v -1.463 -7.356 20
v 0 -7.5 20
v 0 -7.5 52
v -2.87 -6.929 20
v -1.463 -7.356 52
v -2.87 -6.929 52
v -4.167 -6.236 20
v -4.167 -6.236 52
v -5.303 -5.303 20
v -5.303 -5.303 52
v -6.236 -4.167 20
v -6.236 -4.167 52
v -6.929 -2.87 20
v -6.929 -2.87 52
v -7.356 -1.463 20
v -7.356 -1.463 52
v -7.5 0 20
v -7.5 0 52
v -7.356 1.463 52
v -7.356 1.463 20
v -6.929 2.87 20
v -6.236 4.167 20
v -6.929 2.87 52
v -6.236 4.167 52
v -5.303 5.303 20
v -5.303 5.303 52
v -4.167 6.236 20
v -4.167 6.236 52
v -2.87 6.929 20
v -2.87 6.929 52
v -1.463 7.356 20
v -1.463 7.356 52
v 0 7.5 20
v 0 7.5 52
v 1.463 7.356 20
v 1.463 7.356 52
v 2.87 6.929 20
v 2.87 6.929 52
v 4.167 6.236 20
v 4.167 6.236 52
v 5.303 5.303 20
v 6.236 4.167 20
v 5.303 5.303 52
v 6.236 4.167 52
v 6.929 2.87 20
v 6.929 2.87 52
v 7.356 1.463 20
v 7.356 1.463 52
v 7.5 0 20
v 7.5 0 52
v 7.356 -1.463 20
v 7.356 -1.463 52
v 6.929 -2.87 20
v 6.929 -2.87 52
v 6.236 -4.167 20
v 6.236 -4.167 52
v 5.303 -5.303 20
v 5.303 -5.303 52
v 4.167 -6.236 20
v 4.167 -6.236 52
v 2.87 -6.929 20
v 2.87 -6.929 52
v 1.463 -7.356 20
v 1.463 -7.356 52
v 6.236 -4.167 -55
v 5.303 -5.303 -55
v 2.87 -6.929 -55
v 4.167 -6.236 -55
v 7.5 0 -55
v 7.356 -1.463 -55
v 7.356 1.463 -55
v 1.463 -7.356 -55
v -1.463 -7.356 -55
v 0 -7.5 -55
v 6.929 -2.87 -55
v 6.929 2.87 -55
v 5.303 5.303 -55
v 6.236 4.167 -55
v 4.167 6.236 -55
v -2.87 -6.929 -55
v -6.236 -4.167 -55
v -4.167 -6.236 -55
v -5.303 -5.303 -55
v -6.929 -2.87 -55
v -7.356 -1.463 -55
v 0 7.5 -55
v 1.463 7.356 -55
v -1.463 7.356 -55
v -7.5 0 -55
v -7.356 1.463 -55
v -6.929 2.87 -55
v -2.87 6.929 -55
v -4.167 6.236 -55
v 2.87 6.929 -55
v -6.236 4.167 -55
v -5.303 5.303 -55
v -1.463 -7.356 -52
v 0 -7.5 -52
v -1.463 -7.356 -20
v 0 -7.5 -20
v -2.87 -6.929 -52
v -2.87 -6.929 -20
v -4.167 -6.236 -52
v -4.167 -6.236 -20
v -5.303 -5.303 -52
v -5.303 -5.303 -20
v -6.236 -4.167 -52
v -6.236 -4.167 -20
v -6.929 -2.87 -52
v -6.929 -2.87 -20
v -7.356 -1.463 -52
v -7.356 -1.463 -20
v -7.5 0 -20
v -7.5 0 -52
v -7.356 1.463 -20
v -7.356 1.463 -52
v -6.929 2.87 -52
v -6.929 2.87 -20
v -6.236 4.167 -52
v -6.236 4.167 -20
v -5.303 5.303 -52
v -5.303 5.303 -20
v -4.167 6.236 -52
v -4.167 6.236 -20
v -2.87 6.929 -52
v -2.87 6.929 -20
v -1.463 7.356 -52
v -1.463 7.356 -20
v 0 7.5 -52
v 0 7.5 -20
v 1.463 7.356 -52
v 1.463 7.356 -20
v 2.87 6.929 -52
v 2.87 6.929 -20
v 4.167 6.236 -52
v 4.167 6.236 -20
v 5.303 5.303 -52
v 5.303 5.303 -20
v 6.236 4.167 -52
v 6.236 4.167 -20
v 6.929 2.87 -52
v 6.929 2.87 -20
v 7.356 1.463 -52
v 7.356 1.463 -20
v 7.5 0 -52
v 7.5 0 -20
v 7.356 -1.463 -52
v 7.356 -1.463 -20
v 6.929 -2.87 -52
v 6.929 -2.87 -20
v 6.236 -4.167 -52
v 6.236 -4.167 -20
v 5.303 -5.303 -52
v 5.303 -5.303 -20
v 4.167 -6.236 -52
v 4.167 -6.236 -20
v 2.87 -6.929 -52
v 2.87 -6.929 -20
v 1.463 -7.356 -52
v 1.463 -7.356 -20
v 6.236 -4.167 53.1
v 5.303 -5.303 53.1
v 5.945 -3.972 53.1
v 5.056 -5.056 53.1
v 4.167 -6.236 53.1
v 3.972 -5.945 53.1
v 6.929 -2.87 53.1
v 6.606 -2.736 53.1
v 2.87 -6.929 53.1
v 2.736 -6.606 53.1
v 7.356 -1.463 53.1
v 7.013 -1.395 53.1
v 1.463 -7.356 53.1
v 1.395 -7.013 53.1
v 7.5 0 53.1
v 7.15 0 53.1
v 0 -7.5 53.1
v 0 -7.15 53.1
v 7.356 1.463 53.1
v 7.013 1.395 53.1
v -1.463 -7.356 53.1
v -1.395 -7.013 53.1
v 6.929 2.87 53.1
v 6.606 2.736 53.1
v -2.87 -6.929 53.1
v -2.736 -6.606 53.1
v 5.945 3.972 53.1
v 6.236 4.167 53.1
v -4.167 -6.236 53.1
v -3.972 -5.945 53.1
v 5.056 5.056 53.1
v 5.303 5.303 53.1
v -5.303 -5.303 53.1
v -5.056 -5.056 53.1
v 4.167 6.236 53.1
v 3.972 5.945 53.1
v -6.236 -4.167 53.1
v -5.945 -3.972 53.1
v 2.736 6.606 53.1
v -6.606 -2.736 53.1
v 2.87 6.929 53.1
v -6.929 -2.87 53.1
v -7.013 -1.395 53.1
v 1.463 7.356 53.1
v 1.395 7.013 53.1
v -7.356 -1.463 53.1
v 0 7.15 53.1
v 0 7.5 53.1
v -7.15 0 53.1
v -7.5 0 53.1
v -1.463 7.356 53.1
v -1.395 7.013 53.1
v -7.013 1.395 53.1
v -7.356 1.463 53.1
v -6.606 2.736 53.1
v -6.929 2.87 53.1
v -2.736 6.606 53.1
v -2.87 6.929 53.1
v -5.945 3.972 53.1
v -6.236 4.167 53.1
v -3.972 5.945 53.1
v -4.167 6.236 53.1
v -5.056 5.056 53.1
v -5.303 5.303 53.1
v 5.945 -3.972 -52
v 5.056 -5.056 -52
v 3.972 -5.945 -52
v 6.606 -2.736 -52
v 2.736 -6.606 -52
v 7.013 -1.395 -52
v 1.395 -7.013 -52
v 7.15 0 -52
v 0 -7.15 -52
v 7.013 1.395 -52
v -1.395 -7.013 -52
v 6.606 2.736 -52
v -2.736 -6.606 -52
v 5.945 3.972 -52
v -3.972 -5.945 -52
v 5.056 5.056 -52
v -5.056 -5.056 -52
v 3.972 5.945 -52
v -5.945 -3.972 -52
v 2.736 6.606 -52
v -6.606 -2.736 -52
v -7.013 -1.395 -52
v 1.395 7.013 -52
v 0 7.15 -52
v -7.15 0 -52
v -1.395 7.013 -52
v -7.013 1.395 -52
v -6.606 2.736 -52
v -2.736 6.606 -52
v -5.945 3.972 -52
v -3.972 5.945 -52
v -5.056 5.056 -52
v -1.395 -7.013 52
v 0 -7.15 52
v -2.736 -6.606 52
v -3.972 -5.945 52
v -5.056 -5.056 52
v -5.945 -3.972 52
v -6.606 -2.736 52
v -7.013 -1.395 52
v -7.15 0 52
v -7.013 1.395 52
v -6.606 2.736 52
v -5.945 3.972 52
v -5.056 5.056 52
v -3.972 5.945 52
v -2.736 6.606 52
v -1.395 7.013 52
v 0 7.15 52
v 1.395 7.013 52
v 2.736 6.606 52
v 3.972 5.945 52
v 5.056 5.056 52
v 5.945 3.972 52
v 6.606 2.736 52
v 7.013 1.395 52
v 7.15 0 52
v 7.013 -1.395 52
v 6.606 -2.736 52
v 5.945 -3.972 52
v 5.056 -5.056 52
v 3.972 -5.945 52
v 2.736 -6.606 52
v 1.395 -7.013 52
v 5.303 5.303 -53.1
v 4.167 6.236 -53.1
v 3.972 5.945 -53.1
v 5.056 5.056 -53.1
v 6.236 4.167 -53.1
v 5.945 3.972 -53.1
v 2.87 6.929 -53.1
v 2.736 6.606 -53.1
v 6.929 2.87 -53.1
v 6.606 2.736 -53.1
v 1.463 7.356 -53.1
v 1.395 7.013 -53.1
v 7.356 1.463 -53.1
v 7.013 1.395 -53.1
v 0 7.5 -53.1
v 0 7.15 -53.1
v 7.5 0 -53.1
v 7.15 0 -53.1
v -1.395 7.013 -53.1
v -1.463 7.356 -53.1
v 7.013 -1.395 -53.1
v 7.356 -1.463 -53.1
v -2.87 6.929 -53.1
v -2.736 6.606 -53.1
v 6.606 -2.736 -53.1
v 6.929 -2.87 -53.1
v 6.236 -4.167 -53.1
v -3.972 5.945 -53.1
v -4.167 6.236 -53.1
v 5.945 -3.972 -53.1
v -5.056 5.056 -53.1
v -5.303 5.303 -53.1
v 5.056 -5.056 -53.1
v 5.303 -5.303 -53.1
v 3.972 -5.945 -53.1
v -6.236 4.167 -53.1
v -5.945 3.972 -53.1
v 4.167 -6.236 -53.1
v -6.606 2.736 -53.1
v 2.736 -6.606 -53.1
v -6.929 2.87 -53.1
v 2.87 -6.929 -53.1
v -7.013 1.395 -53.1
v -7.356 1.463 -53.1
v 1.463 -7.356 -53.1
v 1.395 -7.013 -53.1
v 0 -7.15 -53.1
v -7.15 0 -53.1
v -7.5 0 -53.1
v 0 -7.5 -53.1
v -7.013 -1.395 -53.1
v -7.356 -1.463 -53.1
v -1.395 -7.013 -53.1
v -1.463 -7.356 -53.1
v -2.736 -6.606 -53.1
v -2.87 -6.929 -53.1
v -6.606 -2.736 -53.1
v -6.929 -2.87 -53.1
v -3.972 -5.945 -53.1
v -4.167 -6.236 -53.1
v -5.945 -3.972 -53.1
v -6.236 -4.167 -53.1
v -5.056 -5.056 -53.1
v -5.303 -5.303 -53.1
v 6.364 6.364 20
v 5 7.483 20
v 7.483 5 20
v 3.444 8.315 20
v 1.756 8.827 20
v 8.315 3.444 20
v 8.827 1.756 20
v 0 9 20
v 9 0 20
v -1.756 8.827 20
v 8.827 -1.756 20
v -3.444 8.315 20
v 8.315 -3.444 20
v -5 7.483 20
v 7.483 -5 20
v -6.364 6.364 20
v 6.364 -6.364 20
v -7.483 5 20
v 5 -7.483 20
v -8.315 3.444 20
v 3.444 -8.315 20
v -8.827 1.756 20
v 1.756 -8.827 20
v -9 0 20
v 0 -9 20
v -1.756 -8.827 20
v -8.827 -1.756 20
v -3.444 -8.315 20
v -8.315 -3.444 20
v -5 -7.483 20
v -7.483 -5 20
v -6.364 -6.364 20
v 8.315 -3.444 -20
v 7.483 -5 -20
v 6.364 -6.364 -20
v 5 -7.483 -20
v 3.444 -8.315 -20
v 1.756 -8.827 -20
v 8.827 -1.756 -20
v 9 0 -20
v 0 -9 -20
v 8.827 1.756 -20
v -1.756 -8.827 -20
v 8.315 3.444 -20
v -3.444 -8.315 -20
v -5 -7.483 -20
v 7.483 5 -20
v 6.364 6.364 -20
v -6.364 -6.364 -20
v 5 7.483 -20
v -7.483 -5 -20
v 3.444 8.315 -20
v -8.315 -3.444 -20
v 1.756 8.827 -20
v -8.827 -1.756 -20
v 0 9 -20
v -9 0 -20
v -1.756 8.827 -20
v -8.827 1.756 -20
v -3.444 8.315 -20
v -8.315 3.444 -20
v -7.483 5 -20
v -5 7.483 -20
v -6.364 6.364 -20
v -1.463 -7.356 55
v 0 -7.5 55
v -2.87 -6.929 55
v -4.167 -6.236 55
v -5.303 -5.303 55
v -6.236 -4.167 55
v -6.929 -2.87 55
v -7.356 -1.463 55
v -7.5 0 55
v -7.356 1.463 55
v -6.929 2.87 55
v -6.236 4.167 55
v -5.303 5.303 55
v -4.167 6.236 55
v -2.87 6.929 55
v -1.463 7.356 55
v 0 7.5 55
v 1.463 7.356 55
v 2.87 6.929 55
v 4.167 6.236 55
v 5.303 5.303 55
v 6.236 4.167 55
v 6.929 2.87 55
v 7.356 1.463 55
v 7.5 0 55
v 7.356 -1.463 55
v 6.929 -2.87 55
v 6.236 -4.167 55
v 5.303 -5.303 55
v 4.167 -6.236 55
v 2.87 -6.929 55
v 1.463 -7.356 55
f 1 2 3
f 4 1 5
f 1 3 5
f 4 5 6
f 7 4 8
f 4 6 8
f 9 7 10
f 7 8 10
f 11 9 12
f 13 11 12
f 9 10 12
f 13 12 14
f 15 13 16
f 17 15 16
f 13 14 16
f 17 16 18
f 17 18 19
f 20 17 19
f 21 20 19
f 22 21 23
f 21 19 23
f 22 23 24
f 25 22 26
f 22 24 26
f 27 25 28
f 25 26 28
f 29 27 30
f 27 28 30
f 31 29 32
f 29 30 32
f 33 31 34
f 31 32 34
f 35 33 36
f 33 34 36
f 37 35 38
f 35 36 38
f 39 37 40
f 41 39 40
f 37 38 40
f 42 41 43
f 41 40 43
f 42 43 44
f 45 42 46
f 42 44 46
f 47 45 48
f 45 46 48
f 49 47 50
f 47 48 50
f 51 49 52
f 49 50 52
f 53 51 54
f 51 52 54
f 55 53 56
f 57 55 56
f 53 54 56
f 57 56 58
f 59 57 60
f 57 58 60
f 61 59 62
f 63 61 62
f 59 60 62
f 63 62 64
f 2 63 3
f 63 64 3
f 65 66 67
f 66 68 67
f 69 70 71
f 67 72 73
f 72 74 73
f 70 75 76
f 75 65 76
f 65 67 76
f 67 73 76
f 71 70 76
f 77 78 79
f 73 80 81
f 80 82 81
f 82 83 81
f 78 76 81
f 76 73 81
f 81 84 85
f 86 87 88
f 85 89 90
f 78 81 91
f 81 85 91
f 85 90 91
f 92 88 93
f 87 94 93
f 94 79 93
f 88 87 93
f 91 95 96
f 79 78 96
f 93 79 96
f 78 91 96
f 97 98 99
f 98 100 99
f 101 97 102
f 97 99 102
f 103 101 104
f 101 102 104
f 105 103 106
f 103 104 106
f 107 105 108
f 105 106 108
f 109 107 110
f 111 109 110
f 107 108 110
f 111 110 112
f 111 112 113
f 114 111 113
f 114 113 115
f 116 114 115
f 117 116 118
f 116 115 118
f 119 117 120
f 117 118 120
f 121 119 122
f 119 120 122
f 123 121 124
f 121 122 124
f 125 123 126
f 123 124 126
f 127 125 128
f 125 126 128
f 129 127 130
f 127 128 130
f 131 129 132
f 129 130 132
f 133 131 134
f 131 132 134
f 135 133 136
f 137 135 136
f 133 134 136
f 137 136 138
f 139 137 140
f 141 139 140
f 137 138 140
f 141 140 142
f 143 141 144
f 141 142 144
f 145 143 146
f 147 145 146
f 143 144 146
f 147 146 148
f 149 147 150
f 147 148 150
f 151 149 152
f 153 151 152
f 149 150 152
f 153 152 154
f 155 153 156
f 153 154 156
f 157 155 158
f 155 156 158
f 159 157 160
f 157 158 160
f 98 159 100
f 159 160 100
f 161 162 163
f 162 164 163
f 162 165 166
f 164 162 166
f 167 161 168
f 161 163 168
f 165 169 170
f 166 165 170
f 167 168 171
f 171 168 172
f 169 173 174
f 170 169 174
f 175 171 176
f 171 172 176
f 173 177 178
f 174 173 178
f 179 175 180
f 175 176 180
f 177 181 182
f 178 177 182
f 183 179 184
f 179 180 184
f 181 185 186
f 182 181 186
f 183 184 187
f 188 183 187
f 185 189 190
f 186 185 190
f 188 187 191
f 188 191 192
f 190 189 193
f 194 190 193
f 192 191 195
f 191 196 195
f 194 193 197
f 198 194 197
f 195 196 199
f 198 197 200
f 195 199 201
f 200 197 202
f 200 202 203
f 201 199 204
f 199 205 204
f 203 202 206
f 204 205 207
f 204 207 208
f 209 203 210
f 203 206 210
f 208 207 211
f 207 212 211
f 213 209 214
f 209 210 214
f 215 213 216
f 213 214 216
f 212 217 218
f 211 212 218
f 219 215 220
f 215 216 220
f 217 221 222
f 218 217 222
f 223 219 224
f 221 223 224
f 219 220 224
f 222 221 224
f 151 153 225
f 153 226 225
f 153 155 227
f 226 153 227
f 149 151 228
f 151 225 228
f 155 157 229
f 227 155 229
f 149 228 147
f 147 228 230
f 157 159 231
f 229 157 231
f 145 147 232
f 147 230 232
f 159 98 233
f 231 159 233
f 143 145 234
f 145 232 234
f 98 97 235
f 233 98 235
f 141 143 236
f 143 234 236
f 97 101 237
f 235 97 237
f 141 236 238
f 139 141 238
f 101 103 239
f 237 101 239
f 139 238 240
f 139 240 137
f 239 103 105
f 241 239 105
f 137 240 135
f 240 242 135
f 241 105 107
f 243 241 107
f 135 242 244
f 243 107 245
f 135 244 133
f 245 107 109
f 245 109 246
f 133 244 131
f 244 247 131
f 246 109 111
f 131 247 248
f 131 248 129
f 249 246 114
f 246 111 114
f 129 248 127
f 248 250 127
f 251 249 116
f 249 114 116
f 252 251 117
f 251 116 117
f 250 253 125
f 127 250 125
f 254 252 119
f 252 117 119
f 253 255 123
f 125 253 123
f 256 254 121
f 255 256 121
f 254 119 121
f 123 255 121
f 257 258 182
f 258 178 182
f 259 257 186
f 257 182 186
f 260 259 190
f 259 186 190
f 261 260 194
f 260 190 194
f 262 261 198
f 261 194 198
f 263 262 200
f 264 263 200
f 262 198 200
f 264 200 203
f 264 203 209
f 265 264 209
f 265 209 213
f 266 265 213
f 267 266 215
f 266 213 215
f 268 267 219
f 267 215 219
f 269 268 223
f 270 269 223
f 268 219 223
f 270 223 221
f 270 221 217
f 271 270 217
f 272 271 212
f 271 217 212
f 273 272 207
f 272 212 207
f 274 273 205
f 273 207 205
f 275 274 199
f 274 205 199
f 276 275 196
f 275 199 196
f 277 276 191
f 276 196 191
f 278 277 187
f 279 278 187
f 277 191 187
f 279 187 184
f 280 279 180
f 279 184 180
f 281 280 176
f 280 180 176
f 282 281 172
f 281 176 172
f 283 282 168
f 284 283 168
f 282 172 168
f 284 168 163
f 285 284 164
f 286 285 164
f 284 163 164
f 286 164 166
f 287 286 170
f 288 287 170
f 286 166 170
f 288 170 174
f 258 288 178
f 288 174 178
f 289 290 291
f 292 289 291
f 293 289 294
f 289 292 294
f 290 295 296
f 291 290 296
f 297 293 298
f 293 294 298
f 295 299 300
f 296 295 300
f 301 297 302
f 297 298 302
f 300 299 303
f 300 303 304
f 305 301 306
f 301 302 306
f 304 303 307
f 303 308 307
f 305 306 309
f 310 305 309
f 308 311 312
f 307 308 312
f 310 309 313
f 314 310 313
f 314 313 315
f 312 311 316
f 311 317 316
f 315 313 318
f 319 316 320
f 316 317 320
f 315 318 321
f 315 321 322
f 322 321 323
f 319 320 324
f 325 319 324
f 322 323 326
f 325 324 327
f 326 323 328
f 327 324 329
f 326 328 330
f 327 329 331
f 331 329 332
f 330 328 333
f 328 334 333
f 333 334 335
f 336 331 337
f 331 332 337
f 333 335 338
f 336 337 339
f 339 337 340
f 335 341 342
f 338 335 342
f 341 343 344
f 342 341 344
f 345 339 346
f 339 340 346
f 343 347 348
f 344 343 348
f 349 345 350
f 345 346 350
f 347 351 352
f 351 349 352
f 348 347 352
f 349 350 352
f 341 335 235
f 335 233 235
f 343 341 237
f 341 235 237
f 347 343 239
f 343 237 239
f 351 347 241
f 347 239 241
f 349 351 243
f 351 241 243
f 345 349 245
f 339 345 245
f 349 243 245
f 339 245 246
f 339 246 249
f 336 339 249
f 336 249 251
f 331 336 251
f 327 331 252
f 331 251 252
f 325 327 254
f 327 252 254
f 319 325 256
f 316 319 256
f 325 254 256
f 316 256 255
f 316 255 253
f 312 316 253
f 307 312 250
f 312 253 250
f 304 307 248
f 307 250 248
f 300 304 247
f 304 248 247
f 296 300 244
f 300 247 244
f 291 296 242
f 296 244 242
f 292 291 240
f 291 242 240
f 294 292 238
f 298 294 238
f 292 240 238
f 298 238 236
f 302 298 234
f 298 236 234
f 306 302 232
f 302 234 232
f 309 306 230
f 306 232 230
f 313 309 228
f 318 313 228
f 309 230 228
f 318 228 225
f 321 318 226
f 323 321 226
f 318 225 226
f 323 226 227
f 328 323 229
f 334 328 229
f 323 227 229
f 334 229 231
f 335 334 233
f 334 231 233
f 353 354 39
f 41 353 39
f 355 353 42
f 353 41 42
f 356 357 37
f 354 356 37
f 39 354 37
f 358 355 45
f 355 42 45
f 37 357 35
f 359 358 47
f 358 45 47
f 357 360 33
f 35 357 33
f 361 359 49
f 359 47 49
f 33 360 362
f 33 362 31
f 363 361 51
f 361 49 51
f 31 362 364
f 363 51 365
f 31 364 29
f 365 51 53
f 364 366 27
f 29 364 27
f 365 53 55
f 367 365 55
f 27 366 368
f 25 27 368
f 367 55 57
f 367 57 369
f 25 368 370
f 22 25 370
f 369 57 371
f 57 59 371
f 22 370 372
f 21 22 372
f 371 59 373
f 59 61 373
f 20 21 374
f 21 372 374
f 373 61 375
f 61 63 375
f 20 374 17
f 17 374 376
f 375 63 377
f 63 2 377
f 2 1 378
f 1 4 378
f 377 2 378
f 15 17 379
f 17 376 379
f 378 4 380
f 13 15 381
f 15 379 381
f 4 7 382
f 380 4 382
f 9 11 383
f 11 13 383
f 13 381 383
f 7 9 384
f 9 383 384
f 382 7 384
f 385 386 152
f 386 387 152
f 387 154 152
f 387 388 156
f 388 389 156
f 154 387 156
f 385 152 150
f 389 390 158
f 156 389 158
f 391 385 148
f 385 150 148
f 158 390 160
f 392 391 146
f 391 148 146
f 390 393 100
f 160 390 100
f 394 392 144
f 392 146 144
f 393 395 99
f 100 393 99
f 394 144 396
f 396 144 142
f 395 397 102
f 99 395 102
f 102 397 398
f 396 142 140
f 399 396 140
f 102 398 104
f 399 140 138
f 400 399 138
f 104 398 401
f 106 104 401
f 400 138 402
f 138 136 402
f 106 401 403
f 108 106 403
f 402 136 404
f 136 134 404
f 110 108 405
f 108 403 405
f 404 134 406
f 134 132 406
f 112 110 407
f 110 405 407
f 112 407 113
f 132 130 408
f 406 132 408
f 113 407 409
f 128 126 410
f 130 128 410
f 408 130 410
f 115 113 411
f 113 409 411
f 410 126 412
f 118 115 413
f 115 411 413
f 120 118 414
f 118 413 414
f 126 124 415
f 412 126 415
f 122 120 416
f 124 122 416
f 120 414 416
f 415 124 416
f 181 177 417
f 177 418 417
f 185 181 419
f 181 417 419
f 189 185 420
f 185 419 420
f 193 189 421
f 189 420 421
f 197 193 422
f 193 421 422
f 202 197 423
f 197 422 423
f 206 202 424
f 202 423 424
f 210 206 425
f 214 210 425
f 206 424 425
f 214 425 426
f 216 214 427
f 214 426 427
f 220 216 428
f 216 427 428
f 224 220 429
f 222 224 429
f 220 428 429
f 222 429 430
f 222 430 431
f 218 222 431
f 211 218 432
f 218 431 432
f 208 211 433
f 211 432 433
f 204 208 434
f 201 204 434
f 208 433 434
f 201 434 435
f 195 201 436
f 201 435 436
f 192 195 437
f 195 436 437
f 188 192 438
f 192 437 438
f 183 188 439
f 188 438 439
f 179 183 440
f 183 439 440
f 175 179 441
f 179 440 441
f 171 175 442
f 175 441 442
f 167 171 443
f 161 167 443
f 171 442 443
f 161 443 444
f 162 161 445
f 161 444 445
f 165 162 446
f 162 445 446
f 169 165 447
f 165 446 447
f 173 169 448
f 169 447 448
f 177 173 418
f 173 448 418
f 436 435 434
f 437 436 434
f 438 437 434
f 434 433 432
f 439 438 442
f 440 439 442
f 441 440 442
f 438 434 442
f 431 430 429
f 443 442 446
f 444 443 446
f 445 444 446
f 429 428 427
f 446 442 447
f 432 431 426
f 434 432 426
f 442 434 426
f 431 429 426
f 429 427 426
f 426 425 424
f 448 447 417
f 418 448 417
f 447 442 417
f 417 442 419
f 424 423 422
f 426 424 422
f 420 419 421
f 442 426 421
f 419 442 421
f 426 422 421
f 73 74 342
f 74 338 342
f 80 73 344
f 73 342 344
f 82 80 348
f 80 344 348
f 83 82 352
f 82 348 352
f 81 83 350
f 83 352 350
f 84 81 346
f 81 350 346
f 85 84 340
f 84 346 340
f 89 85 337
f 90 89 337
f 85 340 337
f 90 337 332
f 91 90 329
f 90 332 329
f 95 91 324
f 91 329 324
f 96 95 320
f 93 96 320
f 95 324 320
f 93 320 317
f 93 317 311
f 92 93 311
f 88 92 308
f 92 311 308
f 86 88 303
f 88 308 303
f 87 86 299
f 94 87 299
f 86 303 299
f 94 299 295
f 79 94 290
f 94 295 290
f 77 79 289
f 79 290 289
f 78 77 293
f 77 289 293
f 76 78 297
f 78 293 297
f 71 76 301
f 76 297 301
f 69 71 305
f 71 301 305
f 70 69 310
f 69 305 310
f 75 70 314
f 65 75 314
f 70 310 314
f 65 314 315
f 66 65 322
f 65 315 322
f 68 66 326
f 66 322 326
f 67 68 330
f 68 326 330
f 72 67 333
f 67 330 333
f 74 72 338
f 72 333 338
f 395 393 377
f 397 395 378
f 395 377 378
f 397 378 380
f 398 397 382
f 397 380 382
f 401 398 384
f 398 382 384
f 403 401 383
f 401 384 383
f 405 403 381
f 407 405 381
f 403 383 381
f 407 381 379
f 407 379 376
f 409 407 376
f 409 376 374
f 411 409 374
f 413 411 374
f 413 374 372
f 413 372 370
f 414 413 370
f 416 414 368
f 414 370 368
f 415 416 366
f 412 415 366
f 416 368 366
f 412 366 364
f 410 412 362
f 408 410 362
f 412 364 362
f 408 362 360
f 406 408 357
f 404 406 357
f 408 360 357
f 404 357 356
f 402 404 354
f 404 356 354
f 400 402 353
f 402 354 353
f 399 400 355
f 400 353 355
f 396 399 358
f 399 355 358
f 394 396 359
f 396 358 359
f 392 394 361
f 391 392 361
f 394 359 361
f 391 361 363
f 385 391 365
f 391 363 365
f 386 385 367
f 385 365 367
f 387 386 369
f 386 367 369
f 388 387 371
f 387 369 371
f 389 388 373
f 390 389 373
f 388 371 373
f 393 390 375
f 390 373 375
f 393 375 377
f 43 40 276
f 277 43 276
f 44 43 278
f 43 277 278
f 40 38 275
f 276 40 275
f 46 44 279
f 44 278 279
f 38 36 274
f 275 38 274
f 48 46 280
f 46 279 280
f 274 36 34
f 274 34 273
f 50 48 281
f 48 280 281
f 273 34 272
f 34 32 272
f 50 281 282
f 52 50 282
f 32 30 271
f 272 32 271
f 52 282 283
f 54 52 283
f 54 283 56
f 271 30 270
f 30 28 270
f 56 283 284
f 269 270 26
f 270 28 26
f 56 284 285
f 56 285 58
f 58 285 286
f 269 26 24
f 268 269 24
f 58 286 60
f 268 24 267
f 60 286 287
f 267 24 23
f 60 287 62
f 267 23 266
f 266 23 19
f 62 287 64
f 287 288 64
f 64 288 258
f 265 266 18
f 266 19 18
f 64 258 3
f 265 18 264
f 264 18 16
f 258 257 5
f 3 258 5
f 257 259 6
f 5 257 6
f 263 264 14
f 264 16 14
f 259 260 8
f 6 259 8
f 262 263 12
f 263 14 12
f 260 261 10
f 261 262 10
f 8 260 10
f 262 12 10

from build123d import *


with BuildPart() as part:
    # Szkic1 → Obrót1 (revolve)
    with BuildSketch(Plane(origin=(0, 0, 0), x_dir=(0, 0, -1), z_dir=(1, 0, 0))):
        Polygon((-55, 0), (55, 0), (55, -7.5), (53.1, -7.5), (53.1, -7.15), (52, -7.15), (52, -7.5), (20, -7.5), (20, -9), (-20, -9), (-20, -7.5), (-52, -7.5), (-52, -7.15), (-53.1, -7.15), (-53.1, -7.5), (-55, -7.5), align=None)
    revolve(axis=Axis((0, 0, 55), (0, 0, -1)))


solid = part.part
